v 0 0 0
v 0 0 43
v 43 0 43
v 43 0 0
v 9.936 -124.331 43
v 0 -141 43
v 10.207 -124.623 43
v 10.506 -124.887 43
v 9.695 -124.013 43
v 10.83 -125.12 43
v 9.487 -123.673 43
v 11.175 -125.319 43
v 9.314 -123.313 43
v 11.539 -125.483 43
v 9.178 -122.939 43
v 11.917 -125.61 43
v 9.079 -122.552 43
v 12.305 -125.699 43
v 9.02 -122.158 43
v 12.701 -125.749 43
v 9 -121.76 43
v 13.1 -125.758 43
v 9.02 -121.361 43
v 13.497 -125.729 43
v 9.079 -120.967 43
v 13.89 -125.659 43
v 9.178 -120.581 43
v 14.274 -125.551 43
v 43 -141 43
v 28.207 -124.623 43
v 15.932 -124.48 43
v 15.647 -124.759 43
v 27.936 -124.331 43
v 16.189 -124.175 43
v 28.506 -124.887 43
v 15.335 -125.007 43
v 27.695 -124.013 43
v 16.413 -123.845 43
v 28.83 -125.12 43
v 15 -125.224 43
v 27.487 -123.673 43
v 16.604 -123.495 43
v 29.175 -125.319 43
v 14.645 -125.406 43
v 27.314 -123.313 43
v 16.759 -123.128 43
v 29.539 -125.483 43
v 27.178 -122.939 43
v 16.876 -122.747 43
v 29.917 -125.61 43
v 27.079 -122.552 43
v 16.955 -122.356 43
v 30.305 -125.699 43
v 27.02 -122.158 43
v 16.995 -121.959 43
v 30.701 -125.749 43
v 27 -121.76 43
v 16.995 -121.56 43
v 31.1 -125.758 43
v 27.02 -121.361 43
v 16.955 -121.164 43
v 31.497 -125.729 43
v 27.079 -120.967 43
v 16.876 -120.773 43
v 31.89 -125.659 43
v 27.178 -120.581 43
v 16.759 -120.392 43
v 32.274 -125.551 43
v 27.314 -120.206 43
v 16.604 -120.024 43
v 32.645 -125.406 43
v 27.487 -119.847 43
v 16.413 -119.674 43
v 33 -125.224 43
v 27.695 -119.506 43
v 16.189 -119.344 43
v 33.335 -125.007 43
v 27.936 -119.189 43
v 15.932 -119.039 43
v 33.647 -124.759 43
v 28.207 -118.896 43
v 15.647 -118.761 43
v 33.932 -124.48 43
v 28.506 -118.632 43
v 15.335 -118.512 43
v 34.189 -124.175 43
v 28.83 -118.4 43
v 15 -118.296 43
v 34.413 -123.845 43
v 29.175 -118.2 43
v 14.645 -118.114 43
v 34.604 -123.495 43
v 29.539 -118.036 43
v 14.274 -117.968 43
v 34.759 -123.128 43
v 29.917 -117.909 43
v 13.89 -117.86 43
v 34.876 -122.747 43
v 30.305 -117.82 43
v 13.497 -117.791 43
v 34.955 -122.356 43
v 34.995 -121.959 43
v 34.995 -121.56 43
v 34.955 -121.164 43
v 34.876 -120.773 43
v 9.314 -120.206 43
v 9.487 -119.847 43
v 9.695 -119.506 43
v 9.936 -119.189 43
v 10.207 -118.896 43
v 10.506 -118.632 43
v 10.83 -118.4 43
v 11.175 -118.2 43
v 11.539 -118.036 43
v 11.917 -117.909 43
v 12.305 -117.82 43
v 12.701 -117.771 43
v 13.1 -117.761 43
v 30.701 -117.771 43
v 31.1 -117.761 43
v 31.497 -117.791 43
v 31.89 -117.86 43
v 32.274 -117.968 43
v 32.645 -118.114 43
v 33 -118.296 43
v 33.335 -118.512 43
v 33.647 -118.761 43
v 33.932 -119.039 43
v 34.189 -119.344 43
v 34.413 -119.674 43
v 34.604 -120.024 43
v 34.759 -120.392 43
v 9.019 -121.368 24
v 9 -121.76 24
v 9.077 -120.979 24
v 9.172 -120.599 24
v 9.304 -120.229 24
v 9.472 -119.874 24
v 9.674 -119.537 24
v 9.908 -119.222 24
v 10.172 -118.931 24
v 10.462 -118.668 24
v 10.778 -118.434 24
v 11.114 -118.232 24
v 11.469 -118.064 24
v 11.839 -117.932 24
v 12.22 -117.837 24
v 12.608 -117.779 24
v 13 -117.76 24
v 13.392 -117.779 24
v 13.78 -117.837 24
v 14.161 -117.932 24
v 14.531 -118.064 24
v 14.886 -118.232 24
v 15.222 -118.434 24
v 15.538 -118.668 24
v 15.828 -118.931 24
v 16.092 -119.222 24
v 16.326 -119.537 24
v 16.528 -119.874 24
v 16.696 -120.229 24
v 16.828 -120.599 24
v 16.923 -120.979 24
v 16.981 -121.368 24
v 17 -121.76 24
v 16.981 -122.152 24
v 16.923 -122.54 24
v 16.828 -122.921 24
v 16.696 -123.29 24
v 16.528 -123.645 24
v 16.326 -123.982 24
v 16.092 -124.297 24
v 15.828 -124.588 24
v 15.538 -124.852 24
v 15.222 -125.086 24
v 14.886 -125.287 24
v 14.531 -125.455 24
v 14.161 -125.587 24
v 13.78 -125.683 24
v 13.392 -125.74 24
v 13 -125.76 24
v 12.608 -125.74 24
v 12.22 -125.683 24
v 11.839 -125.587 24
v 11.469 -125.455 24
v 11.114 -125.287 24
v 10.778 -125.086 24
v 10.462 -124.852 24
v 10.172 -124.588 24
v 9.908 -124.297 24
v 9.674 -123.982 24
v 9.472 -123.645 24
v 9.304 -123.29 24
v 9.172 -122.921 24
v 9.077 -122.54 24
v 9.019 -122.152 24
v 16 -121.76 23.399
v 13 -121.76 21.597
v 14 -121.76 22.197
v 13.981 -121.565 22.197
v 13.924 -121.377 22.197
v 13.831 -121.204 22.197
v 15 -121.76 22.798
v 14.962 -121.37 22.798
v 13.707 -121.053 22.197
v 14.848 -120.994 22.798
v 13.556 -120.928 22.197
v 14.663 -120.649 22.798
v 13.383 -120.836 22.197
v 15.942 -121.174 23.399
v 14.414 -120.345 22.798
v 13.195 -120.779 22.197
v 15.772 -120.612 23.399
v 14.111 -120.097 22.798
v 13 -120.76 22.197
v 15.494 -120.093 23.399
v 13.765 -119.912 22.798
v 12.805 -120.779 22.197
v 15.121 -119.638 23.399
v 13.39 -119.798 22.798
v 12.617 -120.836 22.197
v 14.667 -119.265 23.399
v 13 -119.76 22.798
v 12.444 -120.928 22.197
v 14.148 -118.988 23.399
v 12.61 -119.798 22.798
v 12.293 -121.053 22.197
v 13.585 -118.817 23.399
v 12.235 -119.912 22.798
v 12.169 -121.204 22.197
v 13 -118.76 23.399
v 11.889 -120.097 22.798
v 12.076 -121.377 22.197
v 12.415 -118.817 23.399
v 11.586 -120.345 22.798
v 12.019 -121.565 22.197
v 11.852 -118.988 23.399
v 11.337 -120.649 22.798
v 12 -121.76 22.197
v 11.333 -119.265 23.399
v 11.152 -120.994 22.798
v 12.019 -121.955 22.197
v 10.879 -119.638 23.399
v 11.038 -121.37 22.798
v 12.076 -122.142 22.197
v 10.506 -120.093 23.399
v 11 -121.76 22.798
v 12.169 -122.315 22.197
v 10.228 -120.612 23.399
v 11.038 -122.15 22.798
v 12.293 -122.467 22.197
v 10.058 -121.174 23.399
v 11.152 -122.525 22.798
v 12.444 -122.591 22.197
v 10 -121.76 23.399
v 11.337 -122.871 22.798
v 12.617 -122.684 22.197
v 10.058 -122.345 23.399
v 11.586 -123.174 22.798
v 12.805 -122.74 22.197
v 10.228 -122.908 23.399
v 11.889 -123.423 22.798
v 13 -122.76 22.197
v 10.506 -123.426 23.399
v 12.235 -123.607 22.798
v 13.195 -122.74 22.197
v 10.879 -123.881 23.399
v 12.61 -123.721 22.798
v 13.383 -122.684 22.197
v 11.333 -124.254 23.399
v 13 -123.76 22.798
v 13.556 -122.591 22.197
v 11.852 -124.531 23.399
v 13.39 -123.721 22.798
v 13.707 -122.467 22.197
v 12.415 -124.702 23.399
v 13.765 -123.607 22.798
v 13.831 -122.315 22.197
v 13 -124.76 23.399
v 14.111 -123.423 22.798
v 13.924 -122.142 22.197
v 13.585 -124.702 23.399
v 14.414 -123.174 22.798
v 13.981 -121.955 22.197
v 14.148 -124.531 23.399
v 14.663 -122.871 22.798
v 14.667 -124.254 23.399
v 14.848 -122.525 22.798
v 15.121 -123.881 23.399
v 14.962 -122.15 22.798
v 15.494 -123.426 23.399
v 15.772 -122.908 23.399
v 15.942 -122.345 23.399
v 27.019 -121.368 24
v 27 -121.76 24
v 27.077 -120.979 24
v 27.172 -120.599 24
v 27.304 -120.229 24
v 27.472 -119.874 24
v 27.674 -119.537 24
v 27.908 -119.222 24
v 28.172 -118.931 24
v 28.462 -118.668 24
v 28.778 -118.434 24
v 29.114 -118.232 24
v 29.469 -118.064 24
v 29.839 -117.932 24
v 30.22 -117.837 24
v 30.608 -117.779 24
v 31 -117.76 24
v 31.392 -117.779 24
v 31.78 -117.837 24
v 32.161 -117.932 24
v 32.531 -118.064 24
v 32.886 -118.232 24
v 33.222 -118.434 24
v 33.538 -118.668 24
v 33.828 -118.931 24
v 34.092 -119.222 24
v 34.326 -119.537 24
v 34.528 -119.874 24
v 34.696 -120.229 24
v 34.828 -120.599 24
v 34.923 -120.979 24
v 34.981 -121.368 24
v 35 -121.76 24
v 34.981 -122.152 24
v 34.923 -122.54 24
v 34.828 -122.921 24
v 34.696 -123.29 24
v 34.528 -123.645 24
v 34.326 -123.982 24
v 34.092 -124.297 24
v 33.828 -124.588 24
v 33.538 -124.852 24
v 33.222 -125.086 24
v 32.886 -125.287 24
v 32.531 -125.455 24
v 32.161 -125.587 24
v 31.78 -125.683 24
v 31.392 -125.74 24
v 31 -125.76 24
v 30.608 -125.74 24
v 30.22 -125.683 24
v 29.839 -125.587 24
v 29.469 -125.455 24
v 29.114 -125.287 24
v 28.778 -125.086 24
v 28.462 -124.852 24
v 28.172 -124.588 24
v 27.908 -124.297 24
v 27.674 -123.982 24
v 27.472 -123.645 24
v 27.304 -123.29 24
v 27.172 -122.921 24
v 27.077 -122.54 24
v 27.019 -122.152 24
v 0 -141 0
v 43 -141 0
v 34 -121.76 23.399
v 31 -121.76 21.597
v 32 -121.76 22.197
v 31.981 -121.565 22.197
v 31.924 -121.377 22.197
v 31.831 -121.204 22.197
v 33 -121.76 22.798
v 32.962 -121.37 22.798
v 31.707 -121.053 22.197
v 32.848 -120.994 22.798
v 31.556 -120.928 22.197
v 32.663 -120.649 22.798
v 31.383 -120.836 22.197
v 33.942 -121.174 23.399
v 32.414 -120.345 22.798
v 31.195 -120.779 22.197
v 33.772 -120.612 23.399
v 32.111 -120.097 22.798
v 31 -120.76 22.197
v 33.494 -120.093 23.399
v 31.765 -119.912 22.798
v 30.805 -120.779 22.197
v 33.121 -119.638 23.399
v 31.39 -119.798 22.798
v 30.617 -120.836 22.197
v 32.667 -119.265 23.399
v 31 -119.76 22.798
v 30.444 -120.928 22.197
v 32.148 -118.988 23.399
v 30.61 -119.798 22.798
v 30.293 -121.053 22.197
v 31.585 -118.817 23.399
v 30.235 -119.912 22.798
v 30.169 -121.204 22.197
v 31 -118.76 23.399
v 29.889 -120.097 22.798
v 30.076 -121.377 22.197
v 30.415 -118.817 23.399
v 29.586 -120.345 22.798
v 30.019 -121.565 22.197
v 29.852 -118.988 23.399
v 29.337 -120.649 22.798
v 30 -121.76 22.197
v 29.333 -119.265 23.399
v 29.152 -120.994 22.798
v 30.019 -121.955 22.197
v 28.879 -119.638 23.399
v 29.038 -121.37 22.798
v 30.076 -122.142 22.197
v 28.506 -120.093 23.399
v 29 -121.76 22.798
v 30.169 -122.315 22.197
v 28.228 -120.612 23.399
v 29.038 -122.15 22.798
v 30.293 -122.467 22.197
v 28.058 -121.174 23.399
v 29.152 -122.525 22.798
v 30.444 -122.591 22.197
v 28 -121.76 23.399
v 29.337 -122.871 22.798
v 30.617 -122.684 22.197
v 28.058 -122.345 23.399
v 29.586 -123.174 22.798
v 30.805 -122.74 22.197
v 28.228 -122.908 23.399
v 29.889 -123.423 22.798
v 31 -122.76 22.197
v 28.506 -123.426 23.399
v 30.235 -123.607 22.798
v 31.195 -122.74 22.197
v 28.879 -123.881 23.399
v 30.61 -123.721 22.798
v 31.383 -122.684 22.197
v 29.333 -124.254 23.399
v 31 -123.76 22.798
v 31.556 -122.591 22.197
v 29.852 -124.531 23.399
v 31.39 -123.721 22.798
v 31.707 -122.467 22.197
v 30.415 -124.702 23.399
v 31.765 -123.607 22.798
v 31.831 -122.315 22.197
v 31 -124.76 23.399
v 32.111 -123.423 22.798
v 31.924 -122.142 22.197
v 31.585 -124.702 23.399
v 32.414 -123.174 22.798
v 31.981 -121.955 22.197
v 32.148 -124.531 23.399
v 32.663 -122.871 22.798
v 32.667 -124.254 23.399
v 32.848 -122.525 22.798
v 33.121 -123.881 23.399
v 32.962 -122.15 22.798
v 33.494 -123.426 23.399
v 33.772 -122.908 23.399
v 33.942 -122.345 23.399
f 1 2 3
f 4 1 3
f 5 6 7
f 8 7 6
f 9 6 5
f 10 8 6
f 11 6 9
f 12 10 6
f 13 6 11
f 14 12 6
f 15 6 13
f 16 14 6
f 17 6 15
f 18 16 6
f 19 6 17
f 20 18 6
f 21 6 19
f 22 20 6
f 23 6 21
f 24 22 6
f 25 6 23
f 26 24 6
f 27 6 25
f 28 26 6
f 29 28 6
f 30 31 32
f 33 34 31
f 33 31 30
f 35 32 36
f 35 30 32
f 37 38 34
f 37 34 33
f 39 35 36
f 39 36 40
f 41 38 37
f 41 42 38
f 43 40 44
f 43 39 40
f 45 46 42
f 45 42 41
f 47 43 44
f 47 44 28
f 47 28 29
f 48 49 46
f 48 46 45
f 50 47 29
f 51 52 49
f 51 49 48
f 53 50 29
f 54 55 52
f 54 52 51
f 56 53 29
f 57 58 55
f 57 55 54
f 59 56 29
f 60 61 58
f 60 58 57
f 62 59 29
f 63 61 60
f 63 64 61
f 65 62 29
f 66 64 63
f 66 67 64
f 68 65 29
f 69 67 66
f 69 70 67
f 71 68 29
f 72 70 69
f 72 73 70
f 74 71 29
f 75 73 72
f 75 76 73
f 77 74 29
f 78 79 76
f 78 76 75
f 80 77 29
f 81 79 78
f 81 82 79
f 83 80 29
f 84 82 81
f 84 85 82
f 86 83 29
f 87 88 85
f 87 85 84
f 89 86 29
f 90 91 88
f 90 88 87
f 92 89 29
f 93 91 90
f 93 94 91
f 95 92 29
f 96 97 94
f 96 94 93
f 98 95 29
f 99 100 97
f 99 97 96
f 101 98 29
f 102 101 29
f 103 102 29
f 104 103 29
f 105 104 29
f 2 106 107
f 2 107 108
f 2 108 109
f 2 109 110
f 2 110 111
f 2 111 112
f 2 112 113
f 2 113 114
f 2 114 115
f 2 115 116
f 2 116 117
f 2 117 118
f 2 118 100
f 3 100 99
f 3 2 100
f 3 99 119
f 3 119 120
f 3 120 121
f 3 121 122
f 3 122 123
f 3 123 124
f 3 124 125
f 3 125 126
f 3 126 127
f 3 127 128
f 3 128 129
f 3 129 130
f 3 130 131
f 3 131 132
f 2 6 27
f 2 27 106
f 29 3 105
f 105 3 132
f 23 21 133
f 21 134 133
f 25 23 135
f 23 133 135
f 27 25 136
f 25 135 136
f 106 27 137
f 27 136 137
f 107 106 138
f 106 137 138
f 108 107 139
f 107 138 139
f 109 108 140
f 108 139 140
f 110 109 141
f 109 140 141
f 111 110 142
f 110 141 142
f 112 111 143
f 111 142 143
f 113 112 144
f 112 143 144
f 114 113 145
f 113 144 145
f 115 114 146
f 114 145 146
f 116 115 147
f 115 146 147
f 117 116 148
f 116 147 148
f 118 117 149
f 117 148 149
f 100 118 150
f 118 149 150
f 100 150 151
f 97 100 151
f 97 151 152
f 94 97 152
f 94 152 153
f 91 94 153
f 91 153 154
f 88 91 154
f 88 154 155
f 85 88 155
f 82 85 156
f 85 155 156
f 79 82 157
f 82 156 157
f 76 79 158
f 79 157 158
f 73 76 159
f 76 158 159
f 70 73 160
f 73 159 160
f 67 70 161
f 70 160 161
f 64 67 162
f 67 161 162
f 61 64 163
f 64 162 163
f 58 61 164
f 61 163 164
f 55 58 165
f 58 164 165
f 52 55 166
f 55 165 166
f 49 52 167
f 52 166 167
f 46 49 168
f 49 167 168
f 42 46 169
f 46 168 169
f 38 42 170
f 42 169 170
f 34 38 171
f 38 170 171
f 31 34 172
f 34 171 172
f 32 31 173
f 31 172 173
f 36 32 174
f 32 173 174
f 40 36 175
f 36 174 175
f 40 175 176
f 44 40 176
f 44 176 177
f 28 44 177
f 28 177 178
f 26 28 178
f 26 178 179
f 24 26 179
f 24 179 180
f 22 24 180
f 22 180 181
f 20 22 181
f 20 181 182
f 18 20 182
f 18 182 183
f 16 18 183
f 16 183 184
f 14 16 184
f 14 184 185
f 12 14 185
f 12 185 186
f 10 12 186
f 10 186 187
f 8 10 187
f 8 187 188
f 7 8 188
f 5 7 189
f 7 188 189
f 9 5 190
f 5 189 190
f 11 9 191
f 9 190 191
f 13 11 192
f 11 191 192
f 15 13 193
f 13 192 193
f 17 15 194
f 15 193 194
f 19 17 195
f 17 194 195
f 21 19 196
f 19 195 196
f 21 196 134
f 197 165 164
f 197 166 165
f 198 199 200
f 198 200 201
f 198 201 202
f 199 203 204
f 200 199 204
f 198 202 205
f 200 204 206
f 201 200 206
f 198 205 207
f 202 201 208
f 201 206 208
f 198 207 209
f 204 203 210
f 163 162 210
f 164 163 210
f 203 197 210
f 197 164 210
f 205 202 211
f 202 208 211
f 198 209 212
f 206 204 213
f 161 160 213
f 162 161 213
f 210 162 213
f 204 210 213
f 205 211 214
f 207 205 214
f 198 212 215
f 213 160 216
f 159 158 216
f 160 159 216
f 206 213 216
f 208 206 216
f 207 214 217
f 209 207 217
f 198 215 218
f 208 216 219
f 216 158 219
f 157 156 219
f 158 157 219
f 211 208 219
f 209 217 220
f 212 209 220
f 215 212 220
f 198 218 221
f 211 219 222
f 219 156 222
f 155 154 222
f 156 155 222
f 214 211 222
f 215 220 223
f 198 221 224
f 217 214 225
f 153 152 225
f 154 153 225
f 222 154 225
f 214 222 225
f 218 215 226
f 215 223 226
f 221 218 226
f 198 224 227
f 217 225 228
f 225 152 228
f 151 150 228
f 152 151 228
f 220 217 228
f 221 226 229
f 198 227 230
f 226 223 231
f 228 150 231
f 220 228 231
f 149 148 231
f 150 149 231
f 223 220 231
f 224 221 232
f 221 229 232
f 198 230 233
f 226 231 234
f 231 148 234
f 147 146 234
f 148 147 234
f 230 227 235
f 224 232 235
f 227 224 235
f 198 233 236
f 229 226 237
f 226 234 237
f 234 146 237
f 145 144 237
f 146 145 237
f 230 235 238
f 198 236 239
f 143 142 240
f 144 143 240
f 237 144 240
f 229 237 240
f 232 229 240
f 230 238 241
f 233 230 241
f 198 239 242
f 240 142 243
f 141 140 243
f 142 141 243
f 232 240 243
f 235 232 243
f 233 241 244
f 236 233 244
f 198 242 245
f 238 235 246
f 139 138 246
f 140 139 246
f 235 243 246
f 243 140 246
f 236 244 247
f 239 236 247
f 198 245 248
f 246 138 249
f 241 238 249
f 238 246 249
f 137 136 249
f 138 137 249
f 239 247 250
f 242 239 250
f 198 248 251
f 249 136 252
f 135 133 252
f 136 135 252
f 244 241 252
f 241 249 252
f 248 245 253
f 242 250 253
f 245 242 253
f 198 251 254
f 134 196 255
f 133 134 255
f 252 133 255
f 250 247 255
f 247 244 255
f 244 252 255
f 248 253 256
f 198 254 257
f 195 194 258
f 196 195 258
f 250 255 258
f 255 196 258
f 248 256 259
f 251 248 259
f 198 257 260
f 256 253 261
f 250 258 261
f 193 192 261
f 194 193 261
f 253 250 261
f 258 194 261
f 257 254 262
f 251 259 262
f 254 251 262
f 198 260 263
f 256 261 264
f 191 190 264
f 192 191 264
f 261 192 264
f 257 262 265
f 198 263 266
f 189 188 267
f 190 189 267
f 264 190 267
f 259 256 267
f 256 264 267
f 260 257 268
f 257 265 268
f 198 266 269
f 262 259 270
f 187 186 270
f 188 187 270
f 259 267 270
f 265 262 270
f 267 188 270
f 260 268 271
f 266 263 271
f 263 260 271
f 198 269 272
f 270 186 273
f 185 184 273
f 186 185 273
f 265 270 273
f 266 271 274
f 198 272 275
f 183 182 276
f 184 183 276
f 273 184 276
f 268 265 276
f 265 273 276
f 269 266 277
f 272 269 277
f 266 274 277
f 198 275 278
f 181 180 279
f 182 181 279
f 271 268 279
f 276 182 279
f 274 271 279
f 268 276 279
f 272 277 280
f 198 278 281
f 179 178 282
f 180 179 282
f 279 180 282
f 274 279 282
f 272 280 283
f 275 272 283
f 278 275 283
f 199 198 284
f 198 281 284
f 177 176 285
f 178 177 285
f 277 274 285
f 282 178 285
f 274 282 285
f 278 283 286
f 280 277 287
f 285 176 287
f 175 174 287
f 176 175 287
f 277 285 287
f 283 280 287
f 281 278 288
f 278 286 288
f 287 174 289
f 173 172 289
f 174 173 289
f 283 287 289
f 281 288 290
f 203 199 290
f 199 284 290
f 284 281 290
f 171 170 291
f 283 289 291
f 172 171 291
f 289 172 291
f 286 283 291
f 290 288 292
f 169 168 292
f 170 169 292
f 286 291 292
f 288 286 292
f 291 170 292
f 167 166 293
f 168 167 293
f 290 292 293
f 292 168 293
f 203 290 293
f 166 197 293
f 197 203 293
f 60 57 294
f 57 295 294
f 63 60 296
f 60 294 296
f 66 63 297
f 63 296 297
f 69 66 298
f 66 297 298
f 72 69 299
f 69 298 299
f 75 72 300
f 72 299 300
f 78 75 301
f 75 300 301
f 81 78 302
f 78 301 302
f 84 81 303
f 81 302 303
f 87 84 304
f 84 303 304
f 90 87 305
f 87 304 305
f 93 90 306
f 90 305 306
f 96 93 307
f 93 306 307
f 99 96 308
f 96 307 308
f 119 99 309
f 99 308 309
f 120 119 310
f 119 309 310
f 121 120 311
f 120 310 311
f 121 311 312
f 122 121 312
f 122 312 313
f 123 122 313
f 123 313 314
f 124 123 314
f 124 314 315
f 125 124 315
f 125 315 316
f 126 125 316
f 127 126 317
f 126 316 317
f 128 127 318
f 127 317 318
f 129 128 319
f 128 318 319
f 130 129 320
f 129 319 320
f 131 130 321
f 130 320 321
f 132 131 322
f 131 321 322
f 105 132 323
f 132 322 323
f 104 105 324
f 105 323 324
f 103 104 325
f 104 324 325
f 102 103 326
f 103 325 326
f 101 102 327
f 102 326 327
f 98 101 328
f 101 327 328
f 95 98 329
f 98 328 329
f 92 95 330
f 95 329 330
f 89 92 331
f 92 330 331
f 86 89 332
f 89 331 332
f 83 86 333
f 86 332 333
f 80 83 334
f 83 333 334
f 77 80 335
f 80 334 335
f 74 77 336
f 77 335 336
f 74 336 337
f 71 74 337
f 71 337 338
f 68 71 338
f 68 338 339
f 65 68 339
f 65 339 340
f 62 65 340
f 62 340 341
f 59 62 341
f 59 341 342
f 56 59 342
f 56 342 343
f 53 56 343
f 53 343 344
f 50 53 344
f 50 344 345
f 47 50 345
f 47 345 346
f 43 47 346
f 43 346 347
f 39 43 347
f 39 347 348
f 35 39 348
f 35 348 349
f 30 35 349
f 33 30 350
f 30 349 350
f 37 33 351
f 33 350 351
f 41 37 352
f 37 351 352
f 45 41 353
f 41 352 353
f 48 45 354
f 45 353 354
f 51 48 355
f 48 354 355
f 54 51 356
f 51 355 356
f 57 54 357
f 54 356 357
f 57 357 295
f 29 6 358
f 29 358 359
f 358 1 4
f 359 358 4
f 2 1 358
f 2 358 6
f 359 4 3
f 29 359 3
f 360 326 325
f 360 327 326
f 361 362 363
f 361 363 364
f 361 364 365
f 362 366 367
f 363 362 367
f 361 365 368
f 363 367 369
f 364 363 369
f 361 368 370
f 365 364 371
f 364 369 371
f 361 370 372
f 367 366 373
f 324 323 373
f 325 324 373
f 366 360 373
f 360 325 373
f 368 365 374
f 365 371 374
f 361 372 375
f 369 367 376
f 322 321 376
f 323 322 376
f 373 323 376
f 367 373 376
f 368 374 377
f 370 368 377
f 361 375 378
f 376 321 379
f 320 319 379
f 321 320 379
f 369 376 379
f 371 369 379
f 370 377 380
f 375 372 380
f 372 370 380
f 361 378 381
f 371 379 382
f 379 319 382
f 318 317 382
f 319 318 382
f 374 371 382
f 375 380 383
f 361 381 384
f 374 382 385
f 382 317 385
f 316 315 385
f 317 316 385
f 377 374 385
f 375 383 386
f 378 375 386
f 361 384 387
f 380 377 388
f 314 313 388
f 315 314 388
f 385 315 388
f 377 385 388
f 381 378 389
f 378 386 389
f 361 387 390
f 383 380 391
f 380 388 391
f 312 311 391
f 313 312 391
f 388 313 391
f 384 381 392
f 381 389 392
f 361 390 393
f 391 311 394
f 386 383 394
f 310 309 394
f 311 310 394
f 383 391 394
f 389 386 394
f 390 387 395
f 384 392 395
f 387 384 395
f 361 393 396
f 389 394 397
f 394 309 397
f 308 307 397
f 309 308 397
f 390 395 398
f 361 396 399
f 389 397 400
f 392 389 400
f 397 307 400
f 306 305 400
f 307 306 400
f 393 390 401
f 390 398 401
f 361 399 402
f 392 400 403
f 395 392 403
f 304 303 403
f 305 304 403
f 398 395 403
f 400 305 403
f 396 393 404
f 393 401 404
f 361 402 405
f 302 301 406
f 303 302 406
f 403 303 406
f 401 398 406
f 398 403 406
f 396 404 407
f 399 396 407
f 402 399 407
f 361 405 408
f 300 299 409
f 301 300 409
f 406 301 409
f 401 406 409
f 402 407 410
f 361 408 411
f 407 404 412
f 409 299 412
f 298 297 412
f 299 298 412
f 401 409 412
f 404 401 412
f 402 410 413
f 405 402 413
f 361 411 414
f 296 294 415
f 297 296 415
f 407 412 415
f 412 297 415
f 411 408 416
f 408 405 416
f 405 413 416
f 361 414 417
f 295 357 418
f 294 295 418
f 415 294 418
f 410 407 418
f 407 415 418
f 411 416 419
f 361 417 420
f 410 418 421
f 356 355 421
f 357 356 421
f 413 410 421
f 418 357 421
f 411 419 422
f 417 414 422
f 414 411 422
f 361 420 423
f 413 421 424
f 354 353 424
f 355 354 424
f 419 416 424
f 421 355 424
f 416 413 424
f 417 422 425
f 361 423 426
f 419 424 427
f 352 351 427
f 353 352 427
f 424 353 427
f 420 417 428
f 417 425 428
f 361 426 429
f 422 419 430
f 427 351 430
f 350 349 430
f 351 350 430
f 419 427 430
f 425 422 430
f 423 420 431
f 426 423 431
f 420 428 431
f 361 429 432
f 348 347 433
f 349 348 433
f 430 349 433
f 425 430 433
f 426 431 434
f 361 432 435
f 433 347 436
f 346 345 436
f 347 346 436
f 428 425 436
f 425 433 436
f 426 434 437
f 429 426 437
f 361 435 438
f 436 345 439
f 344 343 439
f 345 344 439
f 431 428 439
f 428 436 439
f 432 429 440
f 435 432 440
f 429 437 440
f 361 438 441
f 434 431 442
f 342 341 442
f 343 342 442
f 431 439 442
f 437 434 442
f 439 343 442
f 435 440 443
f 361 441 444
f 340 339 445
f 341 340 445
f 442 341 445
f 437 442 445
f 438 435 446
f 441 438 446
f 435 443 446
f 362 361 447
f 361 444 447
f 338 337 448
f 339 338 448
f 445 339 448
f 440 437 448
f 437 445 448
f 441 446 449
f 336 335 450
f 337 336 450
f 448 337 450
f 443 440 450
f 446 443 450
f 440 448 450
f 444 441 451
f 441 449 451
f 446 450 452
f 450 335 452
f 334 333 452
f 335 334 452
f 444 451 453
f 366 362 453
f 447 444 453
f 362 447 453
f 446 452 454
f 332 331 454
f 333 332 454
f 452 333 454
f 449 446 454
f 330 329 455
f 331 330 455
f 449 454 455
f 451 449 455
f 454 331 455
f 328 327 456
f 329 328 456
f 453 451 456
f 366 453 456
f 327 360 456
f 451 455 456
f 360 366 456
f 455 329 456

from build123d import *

# Parameters (mm, degrees)
F0_W     = 43
F0_H     = 43
F1_DEPTH = 141
F3_D     = 8
F3_DEPTH = 19
F3_TIP   = 2.4034424761
F4_D     = 8
F4_DEPTH = 19
F4_TIP   = 2.4034424761


with BuildPart() as f1:
    # F0 (on Front) → F1 (new body)
    with BuildSketch(Plane.XZ):
        with Locations((21.5, 21.5)):
            Rectangle(F0_W, F0_H)
    extrude(amount=F1_DEPTH)

    # F3
    with Locations(Plane.XY.offset(43)):
        with Locations((31, -121.7597126961)):
            Hole(F3_D / 2, depth=F3_DEPTH)
            with Locations((0, 0, -(F3_DEPTH + F3_TIP / 2))):  # 118° drill point
                Cone(0, F3_D / 2, F3_TIP, mode=Mode.SUBTRACT)

    # F4
    with Locations(Plane.XY.offset(43)):
        with Locations((13, -121.7597126961)):
            Hole(F4_D / 2, depth=F4_DEPTH)
            with Locations((0, 0, -(F4_DEPTH + F4_TIP / 2))):  # 118° drill point
                Cone(0, F4_D / 2, F4_TIP, mode=Mode.SUBTRACT)


solid = f1.part
